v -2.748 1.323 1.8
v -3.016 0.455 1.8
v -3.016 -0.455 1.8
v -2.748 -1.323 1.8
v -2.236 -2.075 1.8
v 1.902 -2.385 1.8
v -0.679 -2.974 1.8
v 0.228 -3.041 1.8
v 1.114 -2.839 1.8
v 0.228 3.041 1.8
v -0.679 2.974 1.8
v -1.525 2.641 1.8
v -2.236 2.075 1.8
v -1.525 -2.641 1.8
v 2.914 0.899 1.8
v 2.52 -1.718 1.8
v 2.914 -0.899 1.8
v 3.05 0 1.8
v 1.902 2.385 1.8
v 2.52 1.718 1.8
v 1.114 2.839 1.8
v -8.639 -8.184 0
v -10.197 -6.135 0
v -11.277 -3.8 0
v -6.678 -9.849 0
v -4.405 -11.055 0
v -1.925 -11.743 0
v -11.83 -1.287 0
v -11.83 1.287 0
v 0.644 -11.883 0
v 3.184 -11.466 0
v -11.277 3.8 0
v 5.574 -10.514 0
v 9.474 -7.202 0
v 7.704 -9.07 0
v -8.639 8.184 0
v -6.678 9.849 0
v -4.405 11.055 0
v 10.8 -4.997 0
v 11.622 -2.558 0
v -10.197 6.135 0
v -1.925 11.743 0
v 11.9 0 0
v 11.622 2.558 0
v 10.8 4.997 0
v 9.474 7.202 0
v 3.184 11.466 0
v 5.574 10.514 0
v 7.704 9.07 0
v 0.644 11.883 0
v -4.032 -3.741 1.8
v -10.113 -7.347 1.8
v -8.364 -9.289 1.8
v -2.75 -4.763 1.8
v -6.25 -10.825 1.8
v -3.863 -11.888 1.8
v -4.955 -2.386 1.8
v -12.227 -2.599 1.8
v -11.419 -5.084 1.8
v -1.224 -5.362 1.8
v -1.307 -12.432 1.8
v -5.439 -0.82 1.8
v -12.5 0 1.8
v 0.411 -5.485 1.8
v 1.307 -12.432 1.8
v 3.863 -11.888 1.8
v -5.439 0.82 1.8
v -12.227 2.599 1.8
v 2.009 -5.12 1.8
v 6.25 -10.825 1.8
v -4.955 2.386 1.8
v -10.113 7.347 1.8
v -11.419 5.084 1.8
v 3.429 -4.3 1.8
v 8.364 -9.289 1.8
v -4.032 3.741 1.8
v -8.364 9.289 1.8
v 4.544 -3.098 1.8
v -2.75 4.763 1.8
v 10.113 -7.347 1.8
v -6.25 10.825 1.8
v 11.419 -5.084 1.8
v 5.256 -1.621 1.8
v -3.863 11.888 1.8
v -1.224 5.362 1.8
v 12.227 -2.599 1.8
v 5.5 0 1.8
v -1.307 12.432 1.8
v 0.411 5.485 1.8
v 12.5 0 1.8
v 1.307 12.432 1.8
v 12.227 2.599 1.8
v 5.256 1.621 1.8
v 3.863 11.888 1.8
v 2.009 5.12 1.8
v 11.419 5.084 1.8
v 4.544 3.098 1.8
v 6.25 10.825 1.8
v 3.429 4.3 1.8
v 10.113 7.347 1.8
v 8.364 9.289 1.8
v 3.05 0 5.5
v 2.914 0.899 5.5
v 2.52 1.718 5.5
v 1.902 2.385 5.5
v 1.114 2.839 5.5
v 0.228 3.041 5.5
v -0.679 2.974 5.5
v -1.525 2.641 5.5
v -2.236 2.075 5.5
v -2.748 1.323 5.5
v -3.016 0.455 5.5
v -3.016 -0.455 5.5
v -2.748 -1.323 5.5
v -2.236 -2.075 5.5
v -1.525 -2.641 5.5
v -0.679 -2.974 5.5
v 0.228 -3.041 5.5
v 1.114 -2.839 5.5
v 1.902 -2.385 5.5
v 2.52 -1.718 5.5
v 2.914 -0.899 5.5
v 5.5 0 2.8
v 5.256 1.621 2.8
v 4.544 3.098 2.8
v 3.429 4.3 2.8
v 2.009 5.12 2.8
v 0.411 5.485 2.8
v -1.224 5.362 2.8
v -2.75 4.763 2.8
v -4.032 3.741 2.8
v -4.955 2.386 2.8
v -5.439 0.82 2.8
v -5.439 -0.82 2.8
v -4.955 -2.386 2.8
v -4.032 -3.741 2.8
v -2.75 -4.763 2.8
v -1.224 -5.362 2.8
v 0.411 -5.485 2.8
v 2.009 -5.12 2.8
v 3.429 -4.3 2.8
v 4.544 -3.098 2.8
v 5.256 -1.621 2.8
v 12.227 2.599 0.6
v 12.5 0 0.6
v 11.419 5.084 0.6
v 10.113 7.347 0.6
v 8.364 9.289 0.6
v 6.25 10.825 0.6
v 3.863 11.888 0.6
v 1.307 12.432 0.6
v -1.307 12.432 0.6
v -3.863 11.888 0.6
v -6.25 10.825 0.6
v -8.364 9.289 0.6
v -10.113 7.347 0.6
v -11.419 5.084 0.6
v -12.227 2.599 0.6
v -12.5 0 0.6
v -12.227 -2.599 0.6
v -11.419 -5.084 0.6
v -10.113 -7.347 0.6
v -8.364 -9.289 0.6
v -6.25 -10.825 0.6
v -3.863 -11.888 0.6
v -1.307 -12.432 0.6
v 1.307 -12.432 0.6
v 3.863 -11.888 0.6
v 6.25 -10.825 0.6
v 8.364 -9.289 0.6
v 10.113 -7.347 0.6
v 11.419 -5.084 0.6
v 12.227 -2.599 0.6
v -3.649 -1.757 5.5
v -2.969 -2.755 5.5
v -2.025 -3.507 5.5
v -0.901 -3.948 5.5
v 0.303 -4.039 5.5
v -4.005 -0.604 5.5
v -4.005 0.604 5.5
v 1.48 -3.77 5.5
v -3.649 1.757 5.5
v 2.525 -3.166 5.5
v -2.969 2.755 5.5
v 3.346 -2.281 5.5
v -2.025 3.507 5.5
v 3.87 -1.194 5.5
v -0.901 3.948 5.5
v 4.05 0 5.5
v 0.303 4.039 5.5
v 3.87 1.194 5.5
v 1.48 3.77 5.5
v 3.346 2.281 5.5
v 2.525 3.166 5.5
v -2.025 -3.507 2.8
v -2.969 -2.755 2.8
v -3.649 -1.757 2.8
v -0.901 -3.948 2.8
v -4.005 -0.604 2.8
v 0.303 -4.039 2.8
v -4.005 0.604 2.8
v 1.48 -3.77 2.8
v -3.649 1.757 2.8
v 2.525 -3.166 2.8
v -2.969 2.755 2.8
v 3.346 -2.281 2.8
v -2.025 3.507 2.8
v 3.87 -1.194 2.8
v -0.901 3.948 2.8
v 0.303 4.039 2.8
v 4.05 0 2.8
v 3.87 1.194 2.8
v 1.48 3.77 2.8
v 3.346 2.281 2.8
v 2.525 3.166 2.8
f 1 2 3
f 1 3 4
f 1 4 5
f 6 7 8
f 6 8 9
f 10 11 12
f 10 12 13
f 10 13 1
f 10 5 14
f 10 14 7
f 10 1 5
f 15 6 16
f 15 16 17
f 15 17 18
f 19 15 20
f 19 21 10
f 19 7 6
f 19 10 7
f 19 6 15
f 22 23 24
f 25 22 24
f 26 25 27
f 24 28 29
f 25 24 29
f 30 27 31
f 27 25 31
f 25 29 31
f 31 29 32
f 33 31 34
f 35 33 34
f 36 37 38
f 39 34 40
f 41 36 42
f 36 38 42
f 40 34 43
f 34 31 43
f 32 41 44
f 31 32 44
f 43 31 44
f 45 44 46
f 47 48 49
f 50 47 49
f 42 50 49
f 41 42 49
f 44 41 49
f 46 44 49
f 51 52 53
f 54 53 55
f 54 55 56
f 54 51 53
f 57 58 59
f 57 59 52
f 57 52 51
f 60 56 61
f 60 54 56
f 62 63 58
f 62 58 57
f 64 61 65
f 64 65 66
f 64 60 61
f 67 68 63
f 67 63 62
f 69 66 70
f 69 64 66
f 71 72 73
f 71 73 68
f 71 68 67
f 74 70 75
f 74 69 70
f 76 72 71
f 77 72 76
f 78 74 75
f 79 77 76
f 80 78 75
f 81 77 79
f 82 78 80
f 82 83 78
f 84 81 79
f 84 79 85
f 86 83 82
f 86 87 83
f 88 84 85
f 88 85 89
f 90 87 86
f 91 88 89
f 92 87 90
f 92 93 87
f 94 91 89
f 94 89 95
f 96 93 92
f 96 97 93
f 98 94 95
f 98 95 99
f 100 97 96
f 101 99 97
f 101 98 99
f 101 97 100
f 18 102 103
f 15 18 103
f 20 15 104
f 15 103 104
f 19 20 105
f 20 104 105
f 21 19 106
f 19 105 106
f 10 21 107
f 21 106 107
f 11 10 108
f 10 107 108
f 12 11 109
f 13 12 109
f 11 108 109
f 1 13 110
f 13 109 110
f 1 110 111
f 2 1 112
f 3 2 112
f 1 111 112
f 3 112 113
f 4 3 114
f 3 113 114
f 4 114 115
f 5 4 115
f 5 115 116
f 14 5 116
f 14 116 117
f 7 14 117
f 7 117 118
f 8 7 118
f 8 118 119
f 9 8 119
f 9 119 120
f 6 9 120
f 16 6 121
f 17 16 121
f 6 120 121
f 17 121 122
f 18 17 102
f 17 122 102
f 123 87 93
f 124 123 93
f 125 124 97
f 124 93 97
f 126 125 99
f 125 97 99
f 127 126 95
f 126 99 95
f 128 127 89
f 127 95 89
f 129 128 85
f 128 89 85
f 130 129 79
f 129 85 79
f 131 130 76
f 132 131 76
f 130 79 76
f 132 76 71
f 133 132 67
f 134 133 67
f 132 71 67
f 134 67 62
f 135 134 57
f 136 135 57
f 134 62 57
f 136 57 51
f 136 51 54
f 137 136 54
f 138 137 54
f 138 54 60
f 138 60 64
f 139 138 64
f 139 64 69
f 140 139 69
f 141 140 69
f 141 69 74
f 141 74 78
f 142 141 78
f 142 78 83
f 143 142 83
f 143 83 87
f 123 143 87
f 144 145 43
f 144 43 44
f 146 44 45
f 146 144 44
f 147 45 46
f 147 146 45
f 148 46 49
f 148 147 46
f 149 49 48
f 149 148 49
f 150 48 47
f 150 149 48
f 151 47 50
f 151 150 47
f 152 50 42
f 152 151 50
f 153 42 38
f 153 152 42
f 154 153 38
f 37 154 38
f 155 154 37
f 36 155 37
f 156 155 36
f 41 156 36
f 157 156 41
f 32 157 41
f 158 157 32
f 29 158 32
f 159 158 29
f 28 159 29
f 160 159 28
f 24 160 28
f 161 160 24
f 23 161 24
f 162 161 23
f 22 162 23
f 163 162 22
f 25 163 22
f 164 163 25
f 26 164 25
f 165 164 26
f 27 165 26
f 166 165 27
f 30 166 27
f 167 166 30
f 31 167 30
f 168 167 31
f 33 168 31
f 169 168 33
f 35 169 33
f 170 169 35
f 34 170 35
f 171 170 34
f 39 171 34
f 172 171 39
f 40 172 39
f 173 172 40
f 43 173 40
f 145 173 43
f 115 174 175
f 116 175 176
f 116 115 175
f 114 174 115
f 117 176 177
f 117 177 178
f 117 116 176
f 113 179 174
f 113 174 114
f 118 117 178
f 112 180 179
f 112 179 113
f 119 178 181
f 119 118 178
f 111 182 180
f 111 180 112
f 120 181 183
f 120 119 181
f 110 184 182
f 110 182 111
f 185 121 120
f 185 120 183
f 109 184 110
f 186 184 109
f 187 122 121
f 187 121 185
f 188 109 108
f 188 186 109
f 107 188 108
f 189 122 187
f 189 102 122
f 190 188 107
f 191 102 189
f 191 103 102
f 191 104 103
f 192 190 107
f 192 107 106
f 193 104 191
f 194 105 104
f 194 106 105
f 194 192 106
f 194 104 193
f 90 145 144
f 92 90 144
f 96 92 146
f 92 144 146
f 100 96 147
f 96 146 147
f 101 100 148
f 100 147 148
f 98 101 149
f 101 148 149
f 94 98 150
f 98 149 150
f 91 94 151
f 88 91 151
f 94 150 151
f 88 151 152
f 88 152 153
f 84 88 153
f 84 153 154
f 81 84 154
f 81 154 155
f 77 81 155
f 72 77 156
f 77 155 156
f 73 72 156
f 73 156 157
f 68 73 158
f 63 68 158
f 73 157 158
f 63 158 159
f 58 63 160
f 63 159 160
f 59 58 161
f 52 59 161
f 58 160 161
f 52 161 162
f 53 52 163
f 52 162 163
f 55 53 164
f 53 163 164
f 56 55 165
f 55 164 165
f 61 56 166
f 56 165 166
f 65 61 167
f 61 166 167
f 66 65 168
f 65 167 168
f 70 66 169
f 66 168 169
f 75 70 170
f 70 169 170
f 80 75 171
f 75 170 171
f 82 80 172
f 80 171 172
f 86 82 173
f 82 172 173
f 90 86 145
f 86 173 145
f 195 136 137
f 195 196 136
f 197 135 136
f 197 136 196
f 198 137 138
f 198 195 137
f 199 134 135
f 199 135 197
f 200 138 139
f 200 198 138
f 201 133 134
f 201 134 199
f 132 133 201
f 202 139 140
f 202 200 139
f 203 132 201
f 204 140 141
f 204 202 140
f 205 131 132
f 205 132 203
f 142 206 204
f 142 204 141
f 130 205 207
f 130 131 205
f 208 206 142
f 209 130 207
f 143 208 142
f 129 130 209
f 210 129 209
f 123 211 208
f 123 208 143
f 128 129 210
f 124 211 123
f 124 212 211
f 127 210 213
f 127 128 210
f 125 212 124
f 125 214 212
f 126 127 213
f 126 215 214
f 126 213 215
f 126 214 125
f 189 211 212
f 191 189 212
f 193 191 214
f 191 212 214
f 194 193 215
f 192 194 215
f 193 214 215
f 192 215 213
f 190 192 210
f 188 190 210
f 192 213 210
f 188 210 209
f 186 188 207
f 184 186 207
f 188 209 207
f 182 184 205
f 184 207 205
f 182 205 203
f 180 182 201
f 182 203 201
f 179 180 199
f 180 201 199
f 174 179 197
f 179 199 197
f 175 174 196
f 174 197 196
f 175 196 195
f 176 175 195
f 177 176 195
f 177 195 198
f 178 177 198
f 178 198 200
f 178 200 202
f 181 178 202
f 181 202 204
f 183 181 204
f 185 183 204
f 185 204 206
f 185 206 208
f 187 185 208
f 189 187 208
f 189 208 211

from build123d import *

# Parameters (mm, degrees)
F0_R     = 12.5
F0_R_2   = 5.5
F0_R_3   = 4.05
F1_DEPTH = 1.8
F2_DEPTH = 2.8
F3_DEPTH = 5.5
F4_R     = 3.05
F5_DEPTH = 3.7
F6_SIZE  = 0.6


with BuildPart() as f1:
    # F0 (on Top) → F1 (new body)
    with BuildSketch(Plane.XY):
        Circle(F0_R)
        Circle(F0_R_2, mode=Mode.SUBTRACT)
        Circle(F0_R_2)
        Circle(F0_R_3, mode=Mode.SUBTRACT)
        Circle(F0_R_3)
    extrude(amount=F1_DEPTH)

    # F0 (on Top) → F2 (join)
    with BuildSketch(Plane.XY):
        Circle(F0_R_2)
        Circle(F0_R_3, mode=Mode.SUBTRACT)
    extrude(amount=F2_DEPTH)

    # F0 (on Top) → F3 (join)
    with BuildSketch(Plane.XY):
        Circle(F0_R_3)
    extrude(amount=F3_DEPTH)

    # F4 (on face) → F5 (cut, through all)
    with BuildSketch(Plane.XY.offset(5.5)):
        Circle(F4_R)
    extrude(amount=-F5_DEPTH, mode=Mode.SUBTRACT)

    # F6
    f6_edges = [f1.edges().sort_by_distance(p)[0] for p in [
        (-12.5, 0, 0),
    ]]
    chamfer(f6_edges, length=F6_SIZE)


solid = f1.part
